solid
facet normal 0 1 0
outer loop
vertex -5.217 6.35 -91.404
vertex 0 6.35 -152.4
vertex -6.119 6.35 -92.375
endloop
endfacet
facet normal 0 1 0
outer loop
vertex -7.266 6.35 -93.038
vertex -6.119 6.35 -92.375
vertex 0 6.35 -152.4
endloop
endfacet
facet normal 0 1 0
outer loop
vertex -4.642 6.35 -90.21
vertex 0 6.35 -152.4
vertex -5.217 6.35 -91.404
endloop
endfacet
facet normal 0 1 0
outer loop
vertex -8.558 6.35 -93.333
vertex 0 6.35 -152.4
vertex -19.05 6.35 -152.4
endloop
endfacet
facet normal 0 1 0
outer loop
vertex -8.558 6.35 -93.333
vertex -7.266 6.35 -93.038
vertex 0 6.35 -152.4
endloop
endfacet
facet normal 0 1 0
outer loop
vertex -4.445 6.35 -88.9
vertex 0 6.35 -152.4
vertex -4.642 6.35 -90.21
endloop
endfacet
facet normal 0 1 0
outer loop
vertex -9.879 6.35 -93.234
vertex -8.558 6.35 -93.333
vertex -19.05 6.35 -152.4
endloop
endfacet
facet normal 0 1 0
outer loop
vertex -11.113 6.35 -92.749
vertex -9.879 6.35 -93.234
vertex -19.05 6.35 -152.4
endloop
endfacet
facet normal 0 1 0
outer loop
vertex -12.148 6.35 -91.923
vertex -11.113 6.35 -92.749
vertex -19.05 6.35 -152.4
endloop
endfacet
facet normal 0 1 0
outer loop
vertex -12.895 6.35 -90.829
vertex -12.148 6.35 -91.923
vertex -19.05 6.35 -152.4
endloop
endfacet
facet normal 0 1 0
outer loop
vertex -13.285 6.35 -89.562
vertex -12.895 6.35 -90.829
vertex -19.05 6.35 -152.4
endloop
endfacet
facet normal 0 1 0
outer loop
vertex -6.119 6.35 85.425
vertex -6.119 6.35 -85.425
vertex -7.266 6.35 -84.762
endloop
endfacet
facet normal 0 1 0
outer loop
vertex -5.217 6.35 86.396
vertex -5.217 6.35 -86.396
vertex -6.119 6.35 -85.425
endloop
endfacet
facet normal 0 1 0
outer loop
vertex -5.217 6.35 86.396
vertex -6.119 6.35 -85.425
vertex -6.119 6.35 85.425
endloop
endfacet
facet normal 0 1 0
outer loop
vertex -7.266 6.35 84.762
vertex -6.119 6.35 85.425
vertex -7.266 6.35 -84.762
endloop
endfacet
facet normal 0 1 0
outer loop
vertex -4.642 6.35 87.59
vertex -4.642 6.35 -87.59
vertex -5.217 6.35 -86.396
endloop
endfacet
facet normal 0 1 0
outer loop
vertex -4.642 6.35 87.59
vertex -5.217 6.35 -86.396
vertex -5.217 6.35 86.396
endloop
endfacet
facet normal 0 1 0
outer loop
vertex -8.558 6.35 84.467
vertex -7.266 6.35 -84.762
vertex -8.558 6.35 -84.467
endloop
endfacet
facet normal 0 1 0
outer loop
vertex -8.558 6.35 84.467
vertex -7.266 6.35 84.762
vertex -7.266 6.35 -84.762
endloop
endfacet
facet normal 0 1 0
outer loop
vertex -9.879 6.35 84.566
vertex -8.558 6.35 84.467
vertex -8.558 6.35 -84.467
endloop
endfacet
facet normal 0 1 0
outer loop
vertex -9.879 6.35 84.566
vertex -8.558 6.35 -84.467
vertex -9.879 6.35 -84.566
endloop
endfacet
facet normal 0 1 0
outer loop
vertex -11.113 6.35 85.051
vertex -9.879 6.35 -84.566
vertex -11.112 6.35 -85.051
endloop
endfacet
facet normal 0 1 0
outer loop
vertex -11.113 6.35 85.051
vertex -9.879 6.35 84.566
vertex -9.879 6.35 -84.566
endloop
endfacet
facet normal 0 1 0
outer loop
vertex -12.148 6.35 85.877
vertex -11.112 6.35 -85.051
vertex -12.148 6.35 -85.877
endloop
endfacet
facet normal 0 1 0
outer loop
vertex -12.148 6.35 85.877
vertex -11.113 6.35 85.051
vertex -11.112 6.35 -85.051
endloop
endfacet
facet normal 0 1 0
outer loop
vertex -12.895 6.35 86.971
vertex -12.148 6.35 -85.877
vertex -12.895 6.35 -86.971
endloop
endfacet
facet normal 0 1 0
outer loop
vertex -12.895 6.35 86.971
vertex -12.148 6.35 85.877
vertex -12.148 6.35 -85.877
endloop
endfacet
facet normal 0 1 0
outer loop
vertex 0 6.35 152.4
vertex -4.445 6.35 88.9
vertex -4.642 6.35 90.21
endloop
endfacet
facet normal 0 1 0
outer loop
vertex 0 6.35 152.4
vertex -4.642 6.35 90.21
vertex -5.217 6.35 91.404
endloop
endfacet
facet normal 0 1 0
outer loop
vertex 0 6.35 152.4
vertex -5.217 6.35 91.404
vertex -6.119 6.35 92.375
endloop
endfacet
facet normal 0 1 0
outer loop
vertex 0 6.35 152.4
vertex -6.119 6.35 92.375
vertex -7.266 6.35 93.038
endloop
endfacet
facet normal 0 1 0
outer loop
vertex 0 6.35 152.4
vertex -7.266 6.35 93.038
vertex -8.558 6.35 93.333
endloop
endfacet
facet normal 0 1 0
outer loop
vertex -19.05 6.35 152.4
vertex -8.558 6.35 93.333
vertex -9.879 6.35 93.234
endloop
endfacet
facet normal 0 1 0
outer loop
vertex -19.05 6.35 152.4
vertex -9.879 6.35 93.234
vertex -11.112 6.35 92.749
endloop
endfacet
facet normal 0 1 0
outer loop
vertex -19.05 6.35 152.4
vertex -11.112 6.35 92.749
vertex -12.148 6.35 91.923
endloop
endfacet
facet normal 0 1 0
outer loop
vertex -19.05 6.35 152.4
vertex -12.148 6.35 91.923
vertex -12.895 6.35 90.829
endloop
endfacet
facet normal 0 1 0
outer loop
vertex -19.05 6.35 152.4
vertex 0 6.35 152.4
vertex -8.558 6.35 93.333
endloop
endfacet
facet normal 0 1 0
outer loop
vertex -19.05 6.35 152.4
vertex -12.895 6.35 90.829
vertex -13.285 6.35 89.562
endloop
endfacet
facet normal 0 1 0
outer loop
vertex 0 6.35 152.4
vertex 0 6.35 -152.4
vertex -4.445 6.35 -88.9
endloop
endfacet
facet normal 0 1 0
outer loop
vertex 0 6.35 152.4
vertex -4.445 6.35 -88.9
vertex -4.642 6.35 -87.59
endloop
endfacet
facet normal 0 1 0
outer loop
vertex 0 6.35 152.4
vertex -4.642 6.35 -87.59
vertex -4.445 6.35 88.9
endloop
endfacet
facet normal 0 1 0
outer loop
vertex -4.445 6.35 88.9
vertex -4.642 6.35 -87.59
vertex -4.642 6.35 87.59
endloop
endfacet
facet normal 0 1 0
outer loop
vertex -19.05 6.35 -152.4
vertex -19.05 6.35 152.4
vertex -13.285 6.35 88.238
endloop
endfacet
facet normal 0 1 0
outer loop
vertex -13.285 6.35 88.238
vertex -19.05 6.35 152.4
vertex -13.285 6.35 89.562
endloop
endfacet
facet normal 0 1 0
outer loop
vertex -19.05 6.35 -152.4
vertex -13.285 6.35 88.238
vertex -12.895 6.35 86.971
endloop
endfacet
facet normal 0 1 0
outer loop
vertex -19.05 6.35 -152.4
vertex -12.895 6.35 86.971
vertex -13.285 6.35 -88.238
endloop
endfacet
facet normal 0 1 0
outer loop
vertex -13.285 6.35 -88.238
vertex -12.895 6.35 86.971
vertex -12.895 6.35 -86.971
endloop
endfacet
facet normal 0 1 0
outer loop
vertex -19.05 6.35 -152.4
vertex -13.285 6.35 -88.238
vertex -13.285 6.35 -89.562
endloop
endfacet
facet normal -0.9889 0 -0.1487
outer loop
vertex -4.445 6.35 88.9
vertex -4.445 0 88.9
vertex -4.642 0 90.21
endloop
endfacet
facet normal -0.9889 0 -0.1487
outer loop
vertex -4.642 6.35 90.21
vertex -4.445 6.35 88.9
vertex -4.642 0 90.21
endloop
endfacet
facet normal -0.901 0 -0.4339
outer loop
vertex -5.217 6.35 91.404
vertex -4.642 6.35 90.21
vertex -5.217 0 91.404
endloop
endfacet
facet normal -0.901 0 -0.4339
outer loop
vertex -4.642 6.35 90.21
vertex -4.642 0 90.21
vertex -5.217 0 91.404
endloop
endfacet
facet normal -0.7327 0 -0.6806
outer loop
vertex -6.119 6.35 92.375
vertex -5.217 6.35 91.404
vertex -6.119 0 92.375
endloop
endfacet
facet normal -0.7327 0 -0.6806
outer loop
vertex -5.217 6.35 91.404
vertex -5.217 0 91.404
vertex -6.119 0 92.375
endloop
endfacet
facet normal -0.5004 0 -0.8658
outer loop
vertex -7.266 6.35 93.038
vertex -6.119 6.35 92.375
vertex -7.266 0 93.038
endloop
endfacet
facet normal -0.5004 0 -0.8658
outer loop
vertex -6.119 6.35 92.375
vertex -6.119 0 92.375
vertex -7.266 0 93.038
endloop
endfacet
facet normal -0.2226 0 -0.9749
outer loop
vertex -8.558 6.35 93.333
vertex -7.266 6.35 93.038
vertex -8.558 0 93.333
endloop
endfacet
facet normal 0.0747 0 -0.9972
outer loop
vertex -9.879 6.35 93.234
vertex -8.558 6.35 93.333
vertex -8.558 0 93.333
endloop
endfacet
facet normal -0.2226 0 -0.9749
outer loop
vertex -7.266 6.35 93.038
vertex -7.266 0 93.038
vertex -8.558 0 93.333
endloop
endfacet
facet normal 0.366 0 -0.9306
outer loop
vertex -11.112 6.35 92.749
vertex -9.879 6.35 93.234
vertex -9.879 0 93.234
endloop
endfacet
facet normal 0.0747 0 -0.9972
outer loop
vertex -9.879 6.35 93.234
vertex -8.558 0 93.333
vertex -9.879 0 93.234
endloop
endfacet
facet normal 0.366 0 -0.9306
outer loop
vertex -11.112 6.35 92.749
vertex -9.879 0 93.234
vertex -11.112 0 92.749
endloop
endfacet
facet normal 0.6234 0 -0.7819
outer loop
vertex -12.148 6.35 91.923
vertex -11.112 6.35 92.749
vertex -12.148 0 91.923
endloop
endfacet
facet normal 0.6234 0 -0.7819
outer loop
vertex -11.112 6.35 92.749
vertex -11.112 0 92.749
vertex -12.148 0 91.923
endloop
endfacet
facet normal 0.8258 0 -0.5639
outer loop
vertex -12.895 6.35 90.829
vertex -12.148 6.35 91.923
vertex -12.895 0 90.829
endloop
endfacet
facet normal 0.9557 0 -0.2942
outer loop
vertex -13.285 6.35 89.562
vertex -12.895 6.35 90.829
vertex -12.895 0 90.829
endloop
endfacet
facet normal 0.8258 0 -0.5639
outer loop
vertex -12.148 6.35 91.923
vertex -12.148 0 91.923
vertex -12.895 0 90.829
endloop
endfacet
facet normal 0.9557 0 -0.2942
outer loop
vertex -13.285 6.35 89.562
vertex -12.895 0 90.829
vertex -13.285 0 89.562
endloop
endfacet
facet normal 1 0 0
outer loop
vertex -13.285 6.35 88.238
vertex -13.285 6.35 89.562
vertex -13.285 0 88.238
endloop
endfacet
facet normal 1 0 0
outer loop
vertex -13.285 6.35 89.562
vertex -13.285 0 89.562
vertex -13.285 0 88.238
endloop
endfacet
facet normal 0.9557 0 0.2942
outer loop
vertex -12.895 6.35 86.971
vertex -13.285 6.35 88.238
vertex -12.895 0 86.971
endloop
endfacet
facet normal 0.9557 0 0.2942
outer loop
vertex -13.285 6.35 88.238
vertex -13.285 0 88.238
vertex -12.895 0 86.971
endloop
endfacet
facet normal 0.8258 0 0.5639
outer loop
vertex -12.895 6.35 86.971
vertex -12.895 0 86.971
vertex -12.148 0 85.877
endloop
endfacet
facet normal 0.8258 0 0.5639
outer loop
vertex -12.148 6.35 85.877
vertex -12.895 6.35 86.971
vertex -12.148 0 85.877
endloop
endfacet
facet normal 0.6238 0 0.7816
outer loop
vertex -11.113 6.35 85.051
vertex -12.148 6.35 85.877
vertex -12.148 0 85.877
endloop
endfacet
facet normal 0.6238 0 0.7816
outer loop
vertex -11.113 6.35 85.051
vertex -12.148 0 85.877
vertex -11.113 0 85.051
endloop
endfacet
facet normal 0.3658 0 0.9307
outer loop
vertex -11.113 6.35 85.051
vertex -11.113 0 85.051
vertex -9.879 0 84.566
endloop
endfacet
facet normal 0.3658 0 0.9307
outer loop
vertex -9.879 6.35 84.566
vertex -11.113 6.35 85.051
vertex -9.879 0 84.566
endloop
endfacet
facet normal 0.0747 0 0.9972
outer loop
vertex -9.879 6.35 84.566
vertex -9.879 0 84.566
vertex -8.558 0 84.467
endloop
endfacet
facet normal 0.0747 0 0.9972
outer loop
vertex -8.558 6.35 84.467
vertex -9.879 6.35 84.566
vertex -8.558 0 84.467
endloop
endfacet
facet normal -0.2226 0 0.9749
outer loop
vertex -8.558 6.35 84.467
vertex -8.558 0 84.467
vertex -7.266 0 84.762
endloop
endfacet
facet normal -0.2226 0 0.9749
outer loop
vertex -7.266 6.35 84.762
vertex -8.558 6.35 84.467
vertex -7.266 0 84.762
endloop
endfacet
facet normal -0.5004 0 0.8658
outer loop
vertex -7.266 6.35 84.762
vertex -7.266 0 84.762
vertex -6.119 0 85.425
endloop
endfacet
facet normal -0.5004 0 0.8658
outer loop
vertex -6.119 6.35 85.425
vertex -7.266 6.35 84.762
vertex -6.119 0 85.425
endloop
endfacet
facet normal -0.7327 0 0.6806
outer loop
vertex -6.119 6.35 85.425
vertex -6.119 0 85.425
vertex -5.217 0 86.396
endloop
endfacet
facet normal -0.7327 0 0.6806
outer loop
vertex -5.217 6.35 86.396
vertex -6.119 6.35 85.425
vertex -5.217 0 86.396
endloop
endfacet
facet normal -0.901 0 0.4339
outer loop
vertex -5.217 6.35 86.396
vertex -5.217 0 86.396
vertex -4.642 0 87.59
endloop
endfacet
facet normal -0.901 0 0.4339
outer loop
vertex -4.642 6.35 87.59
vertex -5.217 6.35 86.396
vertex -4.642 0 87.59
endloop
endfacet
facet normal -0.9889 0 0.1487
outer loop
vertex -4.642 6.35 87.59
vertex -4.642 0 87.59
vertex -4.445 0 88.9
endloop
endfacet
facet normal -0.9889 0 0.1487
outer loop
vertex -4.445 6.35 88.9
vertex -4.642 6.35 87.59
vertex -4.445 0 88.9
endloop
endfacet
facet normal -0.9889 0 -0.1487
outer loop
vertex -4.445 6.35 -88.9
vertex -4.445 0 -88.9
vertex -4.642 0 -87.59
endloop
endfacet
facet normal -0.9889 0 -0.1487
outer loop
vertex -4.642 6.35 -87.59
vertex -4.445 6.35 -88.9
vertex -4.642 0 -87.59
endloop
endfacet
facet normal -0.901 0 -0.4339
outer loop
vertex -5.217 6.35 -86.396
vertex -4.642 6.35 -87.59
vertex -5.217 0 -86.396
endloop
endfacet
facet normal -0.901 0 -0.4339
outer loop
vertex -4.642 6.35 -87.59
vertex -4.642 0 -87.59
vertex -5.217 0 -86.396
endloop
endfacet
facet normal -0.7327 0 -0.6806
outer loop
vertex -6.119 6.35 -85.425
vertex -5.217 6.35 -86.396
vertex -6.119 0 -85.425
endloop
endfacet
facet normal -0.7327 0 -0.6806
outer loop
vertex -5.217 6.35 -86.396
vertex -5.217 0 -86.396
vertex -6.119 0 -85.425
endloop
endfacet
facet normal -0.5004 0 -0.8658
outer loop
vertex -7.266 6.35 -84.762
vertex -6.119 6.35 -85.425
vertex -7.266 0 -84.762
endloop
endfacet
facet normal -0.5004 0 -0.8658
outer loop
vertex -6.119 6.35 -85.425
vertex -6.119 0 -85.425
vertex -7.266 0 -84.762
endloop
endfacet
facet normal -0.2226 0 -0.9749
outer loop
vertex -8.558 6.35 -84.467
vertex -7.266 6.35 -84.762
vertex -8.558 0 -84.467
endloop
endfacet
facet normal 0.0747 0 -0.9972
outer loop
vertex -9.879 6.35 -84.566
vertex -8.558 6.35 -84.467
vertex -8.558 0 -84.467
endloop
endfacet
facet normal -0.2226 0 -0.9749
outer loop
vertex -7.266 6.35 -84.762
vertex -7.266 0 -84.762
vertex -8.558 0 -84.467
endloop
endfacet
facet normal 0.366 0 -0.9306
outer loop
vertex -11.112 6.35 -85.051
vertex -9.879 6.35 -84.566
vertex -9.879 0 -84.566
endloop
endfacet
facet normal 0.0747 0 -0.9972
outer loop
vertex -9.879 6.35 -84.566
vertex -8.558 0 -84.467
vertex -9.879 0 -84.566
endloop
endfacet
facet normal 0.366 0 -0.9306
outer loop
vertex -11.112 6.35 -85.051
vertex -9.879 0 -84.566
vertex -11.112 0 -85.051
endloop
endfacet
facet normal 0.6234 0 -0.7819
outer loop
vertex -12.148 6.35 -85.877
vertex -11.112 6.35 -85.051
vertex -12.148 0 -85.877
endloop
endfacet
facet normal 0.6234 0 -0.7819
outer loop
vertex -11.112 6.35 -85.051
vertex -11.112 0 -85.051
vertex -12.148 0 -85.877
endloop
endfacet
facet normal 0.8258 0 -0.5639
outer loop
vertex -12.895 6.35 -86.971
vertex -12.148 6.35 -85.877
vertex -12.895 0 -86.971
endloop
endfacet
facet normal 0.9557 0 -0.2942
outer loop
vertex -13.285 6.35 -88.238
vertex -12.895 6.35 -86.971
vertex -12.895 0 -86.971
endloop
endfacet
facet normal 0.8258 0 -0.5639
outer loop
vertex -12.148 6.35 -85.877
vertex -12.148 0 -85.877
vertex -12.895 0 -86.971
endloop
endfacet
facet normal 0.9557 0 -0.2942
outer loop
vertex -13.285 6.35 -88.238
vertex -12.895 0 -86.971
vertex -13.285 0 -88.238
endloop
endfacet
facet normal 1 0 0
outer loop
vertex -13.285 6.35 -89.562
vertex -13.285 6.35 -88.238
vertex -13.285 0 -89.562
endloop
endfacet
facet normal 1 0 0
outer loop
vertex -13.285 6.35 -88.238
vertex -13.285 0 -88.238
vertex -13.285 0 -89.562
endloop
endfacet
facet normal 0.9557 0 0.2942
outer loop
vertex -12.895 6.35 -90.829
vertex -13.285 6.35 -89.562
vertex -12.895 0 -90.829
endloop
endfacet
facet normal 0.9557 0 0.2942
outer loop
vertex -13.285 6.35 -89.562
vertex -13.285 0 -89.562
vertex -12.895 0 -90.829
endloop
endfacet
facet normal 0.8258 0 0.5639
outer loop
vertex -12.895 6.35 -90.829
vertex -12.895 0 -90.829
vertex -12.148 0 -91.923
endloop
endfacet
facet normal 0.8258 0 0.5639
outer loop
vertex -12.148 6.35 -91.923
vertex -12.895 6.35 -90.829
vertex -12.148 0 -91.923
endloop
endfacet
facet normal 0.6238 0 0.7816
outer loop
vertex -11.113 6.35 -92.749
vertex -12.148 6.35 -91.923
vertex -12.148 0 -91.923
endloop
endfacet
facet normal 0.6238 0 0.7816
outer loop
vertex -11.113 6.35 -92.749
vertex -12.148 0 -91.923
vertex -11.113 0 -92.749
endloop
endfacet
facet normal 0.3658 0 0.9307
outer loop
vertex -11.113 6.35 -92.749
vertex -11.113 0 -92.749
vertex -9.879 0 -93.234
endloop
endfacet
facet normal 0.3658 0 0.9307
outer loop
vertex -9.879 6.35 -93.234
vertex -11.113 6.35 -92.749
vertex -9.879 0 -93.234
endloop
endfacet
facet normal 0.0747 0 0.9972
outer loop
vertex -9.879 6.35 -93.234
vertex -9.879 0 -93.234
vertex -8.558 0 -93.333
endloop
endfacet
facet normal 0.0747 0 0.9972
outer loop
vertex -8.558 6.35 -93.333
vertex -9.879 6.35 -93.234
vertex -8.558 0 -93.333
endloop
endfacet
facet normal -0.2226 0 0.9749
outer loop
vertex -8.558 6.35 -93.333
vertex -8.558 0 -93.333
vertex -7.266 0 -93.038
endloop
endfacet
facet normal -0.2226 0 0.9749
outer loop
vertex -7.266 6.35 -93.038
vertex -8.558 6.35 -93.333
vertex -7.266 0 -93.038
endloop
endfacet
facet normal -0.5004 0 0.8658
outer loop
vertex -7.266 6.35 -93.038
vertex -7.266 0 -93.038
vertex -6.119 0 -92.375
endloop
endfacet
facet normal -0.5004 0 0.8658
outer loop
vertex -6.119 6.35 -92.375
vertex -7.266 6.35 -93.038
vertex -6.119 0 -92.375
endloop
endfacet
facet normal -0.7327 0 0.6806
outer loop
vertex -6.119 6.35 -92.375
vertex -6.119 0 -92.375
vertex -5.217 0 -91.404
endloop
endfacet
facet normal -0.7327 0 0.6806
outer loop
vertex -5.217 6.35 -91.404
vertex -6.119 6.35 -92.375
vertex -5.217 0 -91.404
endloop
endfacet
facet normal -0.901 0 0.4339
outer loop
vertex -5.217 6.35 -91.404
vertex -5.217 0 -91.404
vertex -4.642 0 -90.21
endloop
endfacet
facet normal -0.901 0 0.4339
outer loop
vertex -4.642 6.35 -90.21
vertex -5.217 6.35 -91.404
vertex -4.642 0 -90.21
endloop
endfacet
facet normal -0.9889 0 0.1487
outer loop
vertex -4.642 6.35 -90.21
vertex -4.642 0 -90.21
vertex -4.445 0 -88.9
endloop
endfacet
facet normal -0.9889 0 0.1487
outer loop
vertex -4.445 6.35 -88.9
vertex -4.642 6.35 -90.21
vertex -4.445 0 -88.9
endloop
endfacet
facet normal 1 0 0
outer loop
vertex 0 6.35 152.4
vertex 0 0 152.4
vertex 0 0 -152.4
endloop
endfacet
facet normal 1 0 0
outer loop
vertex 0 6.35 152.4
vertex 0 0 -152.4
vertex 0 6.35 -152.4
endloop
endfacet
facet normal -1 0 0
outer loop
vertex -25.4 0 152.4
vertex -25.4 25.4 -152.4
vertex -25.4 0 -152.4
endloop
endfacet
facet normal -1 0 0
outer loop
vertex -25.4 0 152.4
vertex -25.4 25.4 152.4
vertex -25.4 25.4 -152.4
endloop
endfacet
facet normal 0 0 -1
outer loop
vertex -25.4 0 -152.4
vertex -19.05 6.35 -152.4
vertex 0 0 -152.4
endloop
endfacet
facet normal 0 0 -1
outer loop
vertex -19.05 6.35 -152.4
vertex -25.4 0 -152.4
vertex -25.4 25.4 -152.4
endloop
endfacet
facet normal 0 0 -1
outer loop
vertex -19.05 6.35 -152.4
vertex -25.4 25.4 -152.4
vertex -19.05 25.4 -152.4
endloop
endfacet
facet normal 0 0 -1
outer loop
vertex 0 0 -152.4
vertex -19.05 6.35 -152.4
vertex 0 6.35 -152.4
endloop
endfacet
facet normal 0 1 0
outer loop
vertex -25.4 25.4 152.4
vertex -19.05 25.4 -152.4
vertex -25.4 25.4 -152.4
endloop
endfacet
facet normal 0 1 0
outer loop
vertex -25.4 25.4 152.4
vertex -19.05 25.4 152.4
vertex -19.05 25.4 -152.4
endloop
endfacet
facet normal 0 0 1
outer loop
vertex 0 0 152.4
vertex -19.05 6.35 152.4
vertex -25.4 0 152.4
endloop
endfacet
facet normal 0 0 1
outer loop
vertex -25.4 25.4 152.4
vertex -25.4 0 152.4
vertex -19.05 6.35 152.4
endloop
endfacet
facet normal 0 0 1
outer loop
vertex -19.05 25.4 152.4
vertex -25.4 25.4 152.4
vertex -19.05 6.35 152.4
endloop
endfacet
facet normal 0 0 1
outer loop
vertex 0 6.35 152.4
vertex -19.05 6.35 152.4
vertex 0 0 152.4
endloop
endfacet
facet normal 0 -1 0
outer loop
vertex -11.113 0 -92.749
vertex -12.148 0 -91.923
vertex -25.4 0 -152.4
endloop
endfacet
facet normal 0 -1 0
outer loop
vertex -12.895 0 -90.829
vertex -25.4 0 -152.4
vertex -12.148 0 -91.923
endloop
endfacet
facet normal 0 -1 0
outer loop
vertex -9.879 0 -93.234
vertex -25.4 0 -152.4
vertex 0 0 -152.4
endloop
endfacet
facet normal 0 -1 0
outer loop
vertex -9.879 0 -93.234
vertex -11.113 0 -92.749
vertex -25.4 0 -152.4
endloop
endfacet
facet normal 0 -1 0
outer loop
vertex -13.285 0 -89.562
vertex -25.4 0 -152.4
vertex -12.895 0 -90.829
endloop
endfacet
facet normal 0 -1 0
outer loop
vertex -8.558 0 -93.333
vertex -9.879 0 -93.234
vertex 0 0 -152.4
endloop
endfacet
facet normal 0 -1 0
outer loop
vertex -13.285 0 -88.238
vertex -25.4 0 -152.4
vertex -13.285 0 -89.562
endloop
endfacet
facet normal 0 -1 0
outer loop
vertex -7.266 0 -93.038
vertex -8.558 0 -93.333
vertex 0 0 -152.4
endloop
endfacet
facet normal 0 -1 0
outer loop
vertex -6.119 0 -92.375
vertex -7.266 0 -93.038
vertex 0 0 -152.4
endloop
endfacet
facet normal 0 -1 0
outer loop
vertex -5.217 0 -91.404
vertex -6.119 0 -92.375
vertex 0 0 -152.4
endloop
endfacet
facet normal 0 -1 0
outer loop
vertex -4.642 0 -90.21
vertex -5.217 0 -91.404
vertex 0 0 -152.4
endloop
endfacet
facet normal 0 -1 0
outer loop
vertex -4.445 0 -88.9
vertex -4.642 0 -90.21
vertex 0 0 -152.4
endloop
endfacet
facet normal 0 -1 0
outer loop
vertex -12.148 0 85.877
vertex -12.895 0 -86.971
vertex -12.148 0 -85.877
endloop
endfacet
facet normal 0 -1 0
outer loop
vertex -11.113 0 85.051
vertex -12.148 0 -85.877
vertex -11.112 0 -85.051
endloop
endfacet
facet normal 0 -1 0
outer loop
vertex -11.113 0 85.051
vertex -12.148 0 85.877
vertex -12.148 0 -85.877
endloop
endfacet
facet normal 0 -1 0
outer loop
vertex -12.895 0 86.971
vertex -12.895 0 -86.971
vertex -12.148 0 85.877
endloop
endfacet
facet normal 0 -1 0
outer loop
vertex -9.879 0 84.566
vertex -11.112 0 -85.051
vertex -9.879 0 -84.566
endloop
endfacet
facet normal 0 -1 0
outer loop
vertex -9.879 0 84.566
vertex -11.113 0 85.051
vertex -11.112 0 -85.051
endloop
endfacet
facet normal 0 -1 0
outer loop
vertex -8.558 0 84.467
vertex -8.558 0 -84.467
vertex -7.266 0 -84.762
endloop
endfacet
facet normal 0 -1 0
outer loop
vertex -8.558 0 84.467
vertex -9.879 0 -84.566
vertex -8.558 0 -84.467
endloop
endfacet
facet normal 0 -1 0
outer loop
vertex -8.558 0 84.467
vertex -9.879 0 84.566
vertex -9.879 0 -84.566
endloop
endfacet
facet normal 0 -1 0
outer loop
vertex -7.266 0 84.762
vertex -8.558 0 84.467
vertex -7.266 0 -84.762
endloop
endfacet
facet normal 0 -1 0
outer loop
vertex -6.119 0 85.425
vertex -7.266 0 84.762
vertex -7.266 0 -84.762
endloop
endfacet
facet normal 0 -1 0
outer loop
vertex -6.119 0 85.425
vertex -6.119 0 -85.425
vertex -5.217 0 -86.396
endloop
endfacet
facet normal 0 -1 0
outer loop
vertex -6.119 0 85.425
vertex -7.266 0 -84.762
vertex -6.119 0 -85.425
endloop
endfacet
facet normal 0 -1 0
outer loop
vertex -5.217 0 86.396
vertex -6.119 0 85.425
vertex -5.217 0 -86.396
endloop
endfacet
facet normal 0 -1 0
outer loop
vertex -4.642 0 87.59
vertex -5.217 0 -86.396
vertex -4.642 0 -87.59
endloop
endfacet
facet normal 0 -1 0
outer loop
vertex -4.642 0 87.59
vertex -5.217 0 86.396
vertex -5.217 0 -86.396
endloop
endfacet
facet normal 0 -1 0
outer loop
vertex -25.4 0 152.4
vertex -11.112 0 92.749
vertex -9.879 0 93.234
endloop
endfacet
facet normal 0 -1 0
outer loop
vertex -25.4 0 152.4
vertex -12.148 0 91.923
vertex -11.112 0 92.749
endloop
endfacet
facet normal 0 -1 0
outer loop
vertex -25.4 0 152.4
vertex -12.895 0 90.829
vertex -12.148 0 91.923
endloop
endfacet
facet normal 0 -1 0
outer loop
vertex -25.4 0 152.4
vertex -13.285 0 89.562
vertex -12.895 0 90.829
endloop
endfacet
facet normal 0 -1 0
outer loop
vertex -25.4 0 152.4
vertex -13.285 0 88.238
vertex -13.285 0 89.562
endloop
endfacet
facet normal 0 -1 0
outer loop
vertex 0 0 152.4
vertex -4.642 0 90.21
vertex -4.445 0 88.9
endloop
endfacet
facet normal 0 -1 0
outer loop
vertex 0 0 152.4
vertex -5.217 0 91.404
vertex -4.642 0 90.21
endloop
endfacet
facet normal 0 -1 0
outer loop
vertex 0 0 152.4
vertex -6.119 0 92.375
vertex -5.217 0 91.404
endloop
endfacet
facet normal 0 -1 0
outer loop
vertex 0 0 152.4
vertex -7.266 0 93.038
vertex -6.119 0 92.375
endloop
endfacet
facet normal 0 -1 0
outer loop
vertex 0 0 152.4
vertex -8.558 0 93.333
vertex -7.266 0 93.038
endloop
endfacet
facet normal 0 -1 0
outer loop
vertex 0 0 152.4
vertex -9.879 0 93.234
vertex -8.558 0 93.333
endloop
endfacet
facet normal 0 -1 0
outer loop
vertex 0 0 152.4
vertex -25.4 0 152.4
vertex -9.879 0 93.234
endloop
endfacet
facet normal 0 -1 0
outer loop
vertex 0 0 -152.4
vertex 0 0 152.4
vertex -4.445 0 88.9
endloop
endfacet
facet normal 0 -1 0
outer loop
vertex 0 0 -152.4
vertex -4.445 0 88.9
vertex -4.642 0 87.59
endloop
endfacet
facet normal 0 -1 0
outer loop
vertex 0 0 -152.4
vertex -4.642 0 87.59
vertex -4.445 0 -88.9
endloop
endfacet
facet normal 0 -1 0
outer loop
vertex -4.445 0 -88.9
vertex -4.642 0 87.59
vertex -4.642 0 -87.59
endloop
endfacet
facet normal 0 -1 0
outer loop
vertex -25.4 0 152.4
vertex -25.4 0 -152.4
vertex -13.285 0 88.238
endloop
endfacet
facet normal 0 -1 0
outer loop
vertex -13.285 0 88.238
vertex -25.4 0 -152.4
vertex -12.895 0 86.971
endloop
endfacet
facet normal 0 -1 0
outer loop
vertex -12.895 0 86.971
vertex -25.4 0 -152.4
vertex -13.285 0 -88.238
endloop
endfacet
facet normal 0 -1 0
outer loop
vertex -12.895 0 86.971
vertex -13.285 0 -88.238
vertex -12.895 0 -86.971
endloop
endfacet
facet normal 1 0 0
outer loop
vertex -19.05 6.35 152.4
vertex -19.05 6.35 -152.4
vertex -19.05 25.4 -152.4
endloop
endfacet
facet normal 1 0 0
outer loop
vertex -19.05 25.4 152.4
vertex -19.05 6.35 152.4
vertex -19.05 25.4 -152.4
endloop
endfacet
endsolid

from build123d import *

# Parameters (mm, degrees)
F1_DEPTH = 152.4
F2_R     = 4.445
F3_DEPTH = 25.4


with BuildPart() as f1:
    # F0 (on Top) → F1 (new body, symmetric)
    with BuildSketch(Plane.XY):
        Polygon((-25.4, 0), (0, 0), (0, 6.35), (-19.05, 6.35), (-19.05, 25.4), (-25.4, 25.4), align=None)
    extrude(amount=F1_DEPTH, both=True)

    # F2 (on face) → F3 (cut)
    with BuildSketch(Plane.XZ):
        with Locations((-8.89, 88.9)):
            Circle(F2_R)
        with Locations((-8.89, -88.9)):
            Circle(F2_R)
    extrude(amount=-F3_DEPTH, mode=Mode.SUBTRACT)


solid = f1.part
